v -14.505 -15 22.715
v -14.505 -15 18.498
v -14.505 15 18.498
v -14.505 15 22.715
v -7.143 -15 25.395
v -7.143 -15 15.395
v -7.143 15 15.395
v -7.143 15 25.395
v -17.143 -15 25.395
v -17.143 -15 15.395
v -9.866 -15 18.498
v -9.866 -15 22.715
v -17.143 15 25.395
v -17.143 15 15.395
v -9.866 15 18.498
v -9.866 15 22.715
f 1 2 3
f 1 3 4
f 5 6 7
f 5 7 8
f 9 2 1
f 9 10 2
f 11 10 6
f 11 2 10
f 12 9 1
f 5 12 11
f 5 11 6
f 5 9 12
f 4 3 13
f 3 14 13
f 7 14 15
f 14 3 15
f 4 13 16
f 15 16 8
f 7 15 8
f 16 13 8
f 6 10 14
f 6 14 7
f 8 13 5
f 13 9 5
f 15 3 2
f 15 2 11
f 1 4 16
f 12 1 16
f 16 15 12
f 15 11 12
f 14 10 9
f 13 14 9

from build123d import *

# Parameters (mm, degrees)
F0_W     = 10
F0_H     = 10
F0_W_2   = 4.63939
F0_H_2   = 4.217628
F1_DEPTH = 15


with BuildPart() as f1:
    # F0 (on Front) → F1 (new body, symmetric)
    with BuildSketch(Plane.XZ):
        with Locations((-12.142848, 20.394608)):
            Rectangle(F0_W, F0_H)
        with Locations((-12.185742, 20.606382)):
            Rectangle(F0_W_2, F0_H_2, mode=Mode.SUBTRACT)
    extrude(amount=F1_DEPTH, both=True)


solid = f1.part
